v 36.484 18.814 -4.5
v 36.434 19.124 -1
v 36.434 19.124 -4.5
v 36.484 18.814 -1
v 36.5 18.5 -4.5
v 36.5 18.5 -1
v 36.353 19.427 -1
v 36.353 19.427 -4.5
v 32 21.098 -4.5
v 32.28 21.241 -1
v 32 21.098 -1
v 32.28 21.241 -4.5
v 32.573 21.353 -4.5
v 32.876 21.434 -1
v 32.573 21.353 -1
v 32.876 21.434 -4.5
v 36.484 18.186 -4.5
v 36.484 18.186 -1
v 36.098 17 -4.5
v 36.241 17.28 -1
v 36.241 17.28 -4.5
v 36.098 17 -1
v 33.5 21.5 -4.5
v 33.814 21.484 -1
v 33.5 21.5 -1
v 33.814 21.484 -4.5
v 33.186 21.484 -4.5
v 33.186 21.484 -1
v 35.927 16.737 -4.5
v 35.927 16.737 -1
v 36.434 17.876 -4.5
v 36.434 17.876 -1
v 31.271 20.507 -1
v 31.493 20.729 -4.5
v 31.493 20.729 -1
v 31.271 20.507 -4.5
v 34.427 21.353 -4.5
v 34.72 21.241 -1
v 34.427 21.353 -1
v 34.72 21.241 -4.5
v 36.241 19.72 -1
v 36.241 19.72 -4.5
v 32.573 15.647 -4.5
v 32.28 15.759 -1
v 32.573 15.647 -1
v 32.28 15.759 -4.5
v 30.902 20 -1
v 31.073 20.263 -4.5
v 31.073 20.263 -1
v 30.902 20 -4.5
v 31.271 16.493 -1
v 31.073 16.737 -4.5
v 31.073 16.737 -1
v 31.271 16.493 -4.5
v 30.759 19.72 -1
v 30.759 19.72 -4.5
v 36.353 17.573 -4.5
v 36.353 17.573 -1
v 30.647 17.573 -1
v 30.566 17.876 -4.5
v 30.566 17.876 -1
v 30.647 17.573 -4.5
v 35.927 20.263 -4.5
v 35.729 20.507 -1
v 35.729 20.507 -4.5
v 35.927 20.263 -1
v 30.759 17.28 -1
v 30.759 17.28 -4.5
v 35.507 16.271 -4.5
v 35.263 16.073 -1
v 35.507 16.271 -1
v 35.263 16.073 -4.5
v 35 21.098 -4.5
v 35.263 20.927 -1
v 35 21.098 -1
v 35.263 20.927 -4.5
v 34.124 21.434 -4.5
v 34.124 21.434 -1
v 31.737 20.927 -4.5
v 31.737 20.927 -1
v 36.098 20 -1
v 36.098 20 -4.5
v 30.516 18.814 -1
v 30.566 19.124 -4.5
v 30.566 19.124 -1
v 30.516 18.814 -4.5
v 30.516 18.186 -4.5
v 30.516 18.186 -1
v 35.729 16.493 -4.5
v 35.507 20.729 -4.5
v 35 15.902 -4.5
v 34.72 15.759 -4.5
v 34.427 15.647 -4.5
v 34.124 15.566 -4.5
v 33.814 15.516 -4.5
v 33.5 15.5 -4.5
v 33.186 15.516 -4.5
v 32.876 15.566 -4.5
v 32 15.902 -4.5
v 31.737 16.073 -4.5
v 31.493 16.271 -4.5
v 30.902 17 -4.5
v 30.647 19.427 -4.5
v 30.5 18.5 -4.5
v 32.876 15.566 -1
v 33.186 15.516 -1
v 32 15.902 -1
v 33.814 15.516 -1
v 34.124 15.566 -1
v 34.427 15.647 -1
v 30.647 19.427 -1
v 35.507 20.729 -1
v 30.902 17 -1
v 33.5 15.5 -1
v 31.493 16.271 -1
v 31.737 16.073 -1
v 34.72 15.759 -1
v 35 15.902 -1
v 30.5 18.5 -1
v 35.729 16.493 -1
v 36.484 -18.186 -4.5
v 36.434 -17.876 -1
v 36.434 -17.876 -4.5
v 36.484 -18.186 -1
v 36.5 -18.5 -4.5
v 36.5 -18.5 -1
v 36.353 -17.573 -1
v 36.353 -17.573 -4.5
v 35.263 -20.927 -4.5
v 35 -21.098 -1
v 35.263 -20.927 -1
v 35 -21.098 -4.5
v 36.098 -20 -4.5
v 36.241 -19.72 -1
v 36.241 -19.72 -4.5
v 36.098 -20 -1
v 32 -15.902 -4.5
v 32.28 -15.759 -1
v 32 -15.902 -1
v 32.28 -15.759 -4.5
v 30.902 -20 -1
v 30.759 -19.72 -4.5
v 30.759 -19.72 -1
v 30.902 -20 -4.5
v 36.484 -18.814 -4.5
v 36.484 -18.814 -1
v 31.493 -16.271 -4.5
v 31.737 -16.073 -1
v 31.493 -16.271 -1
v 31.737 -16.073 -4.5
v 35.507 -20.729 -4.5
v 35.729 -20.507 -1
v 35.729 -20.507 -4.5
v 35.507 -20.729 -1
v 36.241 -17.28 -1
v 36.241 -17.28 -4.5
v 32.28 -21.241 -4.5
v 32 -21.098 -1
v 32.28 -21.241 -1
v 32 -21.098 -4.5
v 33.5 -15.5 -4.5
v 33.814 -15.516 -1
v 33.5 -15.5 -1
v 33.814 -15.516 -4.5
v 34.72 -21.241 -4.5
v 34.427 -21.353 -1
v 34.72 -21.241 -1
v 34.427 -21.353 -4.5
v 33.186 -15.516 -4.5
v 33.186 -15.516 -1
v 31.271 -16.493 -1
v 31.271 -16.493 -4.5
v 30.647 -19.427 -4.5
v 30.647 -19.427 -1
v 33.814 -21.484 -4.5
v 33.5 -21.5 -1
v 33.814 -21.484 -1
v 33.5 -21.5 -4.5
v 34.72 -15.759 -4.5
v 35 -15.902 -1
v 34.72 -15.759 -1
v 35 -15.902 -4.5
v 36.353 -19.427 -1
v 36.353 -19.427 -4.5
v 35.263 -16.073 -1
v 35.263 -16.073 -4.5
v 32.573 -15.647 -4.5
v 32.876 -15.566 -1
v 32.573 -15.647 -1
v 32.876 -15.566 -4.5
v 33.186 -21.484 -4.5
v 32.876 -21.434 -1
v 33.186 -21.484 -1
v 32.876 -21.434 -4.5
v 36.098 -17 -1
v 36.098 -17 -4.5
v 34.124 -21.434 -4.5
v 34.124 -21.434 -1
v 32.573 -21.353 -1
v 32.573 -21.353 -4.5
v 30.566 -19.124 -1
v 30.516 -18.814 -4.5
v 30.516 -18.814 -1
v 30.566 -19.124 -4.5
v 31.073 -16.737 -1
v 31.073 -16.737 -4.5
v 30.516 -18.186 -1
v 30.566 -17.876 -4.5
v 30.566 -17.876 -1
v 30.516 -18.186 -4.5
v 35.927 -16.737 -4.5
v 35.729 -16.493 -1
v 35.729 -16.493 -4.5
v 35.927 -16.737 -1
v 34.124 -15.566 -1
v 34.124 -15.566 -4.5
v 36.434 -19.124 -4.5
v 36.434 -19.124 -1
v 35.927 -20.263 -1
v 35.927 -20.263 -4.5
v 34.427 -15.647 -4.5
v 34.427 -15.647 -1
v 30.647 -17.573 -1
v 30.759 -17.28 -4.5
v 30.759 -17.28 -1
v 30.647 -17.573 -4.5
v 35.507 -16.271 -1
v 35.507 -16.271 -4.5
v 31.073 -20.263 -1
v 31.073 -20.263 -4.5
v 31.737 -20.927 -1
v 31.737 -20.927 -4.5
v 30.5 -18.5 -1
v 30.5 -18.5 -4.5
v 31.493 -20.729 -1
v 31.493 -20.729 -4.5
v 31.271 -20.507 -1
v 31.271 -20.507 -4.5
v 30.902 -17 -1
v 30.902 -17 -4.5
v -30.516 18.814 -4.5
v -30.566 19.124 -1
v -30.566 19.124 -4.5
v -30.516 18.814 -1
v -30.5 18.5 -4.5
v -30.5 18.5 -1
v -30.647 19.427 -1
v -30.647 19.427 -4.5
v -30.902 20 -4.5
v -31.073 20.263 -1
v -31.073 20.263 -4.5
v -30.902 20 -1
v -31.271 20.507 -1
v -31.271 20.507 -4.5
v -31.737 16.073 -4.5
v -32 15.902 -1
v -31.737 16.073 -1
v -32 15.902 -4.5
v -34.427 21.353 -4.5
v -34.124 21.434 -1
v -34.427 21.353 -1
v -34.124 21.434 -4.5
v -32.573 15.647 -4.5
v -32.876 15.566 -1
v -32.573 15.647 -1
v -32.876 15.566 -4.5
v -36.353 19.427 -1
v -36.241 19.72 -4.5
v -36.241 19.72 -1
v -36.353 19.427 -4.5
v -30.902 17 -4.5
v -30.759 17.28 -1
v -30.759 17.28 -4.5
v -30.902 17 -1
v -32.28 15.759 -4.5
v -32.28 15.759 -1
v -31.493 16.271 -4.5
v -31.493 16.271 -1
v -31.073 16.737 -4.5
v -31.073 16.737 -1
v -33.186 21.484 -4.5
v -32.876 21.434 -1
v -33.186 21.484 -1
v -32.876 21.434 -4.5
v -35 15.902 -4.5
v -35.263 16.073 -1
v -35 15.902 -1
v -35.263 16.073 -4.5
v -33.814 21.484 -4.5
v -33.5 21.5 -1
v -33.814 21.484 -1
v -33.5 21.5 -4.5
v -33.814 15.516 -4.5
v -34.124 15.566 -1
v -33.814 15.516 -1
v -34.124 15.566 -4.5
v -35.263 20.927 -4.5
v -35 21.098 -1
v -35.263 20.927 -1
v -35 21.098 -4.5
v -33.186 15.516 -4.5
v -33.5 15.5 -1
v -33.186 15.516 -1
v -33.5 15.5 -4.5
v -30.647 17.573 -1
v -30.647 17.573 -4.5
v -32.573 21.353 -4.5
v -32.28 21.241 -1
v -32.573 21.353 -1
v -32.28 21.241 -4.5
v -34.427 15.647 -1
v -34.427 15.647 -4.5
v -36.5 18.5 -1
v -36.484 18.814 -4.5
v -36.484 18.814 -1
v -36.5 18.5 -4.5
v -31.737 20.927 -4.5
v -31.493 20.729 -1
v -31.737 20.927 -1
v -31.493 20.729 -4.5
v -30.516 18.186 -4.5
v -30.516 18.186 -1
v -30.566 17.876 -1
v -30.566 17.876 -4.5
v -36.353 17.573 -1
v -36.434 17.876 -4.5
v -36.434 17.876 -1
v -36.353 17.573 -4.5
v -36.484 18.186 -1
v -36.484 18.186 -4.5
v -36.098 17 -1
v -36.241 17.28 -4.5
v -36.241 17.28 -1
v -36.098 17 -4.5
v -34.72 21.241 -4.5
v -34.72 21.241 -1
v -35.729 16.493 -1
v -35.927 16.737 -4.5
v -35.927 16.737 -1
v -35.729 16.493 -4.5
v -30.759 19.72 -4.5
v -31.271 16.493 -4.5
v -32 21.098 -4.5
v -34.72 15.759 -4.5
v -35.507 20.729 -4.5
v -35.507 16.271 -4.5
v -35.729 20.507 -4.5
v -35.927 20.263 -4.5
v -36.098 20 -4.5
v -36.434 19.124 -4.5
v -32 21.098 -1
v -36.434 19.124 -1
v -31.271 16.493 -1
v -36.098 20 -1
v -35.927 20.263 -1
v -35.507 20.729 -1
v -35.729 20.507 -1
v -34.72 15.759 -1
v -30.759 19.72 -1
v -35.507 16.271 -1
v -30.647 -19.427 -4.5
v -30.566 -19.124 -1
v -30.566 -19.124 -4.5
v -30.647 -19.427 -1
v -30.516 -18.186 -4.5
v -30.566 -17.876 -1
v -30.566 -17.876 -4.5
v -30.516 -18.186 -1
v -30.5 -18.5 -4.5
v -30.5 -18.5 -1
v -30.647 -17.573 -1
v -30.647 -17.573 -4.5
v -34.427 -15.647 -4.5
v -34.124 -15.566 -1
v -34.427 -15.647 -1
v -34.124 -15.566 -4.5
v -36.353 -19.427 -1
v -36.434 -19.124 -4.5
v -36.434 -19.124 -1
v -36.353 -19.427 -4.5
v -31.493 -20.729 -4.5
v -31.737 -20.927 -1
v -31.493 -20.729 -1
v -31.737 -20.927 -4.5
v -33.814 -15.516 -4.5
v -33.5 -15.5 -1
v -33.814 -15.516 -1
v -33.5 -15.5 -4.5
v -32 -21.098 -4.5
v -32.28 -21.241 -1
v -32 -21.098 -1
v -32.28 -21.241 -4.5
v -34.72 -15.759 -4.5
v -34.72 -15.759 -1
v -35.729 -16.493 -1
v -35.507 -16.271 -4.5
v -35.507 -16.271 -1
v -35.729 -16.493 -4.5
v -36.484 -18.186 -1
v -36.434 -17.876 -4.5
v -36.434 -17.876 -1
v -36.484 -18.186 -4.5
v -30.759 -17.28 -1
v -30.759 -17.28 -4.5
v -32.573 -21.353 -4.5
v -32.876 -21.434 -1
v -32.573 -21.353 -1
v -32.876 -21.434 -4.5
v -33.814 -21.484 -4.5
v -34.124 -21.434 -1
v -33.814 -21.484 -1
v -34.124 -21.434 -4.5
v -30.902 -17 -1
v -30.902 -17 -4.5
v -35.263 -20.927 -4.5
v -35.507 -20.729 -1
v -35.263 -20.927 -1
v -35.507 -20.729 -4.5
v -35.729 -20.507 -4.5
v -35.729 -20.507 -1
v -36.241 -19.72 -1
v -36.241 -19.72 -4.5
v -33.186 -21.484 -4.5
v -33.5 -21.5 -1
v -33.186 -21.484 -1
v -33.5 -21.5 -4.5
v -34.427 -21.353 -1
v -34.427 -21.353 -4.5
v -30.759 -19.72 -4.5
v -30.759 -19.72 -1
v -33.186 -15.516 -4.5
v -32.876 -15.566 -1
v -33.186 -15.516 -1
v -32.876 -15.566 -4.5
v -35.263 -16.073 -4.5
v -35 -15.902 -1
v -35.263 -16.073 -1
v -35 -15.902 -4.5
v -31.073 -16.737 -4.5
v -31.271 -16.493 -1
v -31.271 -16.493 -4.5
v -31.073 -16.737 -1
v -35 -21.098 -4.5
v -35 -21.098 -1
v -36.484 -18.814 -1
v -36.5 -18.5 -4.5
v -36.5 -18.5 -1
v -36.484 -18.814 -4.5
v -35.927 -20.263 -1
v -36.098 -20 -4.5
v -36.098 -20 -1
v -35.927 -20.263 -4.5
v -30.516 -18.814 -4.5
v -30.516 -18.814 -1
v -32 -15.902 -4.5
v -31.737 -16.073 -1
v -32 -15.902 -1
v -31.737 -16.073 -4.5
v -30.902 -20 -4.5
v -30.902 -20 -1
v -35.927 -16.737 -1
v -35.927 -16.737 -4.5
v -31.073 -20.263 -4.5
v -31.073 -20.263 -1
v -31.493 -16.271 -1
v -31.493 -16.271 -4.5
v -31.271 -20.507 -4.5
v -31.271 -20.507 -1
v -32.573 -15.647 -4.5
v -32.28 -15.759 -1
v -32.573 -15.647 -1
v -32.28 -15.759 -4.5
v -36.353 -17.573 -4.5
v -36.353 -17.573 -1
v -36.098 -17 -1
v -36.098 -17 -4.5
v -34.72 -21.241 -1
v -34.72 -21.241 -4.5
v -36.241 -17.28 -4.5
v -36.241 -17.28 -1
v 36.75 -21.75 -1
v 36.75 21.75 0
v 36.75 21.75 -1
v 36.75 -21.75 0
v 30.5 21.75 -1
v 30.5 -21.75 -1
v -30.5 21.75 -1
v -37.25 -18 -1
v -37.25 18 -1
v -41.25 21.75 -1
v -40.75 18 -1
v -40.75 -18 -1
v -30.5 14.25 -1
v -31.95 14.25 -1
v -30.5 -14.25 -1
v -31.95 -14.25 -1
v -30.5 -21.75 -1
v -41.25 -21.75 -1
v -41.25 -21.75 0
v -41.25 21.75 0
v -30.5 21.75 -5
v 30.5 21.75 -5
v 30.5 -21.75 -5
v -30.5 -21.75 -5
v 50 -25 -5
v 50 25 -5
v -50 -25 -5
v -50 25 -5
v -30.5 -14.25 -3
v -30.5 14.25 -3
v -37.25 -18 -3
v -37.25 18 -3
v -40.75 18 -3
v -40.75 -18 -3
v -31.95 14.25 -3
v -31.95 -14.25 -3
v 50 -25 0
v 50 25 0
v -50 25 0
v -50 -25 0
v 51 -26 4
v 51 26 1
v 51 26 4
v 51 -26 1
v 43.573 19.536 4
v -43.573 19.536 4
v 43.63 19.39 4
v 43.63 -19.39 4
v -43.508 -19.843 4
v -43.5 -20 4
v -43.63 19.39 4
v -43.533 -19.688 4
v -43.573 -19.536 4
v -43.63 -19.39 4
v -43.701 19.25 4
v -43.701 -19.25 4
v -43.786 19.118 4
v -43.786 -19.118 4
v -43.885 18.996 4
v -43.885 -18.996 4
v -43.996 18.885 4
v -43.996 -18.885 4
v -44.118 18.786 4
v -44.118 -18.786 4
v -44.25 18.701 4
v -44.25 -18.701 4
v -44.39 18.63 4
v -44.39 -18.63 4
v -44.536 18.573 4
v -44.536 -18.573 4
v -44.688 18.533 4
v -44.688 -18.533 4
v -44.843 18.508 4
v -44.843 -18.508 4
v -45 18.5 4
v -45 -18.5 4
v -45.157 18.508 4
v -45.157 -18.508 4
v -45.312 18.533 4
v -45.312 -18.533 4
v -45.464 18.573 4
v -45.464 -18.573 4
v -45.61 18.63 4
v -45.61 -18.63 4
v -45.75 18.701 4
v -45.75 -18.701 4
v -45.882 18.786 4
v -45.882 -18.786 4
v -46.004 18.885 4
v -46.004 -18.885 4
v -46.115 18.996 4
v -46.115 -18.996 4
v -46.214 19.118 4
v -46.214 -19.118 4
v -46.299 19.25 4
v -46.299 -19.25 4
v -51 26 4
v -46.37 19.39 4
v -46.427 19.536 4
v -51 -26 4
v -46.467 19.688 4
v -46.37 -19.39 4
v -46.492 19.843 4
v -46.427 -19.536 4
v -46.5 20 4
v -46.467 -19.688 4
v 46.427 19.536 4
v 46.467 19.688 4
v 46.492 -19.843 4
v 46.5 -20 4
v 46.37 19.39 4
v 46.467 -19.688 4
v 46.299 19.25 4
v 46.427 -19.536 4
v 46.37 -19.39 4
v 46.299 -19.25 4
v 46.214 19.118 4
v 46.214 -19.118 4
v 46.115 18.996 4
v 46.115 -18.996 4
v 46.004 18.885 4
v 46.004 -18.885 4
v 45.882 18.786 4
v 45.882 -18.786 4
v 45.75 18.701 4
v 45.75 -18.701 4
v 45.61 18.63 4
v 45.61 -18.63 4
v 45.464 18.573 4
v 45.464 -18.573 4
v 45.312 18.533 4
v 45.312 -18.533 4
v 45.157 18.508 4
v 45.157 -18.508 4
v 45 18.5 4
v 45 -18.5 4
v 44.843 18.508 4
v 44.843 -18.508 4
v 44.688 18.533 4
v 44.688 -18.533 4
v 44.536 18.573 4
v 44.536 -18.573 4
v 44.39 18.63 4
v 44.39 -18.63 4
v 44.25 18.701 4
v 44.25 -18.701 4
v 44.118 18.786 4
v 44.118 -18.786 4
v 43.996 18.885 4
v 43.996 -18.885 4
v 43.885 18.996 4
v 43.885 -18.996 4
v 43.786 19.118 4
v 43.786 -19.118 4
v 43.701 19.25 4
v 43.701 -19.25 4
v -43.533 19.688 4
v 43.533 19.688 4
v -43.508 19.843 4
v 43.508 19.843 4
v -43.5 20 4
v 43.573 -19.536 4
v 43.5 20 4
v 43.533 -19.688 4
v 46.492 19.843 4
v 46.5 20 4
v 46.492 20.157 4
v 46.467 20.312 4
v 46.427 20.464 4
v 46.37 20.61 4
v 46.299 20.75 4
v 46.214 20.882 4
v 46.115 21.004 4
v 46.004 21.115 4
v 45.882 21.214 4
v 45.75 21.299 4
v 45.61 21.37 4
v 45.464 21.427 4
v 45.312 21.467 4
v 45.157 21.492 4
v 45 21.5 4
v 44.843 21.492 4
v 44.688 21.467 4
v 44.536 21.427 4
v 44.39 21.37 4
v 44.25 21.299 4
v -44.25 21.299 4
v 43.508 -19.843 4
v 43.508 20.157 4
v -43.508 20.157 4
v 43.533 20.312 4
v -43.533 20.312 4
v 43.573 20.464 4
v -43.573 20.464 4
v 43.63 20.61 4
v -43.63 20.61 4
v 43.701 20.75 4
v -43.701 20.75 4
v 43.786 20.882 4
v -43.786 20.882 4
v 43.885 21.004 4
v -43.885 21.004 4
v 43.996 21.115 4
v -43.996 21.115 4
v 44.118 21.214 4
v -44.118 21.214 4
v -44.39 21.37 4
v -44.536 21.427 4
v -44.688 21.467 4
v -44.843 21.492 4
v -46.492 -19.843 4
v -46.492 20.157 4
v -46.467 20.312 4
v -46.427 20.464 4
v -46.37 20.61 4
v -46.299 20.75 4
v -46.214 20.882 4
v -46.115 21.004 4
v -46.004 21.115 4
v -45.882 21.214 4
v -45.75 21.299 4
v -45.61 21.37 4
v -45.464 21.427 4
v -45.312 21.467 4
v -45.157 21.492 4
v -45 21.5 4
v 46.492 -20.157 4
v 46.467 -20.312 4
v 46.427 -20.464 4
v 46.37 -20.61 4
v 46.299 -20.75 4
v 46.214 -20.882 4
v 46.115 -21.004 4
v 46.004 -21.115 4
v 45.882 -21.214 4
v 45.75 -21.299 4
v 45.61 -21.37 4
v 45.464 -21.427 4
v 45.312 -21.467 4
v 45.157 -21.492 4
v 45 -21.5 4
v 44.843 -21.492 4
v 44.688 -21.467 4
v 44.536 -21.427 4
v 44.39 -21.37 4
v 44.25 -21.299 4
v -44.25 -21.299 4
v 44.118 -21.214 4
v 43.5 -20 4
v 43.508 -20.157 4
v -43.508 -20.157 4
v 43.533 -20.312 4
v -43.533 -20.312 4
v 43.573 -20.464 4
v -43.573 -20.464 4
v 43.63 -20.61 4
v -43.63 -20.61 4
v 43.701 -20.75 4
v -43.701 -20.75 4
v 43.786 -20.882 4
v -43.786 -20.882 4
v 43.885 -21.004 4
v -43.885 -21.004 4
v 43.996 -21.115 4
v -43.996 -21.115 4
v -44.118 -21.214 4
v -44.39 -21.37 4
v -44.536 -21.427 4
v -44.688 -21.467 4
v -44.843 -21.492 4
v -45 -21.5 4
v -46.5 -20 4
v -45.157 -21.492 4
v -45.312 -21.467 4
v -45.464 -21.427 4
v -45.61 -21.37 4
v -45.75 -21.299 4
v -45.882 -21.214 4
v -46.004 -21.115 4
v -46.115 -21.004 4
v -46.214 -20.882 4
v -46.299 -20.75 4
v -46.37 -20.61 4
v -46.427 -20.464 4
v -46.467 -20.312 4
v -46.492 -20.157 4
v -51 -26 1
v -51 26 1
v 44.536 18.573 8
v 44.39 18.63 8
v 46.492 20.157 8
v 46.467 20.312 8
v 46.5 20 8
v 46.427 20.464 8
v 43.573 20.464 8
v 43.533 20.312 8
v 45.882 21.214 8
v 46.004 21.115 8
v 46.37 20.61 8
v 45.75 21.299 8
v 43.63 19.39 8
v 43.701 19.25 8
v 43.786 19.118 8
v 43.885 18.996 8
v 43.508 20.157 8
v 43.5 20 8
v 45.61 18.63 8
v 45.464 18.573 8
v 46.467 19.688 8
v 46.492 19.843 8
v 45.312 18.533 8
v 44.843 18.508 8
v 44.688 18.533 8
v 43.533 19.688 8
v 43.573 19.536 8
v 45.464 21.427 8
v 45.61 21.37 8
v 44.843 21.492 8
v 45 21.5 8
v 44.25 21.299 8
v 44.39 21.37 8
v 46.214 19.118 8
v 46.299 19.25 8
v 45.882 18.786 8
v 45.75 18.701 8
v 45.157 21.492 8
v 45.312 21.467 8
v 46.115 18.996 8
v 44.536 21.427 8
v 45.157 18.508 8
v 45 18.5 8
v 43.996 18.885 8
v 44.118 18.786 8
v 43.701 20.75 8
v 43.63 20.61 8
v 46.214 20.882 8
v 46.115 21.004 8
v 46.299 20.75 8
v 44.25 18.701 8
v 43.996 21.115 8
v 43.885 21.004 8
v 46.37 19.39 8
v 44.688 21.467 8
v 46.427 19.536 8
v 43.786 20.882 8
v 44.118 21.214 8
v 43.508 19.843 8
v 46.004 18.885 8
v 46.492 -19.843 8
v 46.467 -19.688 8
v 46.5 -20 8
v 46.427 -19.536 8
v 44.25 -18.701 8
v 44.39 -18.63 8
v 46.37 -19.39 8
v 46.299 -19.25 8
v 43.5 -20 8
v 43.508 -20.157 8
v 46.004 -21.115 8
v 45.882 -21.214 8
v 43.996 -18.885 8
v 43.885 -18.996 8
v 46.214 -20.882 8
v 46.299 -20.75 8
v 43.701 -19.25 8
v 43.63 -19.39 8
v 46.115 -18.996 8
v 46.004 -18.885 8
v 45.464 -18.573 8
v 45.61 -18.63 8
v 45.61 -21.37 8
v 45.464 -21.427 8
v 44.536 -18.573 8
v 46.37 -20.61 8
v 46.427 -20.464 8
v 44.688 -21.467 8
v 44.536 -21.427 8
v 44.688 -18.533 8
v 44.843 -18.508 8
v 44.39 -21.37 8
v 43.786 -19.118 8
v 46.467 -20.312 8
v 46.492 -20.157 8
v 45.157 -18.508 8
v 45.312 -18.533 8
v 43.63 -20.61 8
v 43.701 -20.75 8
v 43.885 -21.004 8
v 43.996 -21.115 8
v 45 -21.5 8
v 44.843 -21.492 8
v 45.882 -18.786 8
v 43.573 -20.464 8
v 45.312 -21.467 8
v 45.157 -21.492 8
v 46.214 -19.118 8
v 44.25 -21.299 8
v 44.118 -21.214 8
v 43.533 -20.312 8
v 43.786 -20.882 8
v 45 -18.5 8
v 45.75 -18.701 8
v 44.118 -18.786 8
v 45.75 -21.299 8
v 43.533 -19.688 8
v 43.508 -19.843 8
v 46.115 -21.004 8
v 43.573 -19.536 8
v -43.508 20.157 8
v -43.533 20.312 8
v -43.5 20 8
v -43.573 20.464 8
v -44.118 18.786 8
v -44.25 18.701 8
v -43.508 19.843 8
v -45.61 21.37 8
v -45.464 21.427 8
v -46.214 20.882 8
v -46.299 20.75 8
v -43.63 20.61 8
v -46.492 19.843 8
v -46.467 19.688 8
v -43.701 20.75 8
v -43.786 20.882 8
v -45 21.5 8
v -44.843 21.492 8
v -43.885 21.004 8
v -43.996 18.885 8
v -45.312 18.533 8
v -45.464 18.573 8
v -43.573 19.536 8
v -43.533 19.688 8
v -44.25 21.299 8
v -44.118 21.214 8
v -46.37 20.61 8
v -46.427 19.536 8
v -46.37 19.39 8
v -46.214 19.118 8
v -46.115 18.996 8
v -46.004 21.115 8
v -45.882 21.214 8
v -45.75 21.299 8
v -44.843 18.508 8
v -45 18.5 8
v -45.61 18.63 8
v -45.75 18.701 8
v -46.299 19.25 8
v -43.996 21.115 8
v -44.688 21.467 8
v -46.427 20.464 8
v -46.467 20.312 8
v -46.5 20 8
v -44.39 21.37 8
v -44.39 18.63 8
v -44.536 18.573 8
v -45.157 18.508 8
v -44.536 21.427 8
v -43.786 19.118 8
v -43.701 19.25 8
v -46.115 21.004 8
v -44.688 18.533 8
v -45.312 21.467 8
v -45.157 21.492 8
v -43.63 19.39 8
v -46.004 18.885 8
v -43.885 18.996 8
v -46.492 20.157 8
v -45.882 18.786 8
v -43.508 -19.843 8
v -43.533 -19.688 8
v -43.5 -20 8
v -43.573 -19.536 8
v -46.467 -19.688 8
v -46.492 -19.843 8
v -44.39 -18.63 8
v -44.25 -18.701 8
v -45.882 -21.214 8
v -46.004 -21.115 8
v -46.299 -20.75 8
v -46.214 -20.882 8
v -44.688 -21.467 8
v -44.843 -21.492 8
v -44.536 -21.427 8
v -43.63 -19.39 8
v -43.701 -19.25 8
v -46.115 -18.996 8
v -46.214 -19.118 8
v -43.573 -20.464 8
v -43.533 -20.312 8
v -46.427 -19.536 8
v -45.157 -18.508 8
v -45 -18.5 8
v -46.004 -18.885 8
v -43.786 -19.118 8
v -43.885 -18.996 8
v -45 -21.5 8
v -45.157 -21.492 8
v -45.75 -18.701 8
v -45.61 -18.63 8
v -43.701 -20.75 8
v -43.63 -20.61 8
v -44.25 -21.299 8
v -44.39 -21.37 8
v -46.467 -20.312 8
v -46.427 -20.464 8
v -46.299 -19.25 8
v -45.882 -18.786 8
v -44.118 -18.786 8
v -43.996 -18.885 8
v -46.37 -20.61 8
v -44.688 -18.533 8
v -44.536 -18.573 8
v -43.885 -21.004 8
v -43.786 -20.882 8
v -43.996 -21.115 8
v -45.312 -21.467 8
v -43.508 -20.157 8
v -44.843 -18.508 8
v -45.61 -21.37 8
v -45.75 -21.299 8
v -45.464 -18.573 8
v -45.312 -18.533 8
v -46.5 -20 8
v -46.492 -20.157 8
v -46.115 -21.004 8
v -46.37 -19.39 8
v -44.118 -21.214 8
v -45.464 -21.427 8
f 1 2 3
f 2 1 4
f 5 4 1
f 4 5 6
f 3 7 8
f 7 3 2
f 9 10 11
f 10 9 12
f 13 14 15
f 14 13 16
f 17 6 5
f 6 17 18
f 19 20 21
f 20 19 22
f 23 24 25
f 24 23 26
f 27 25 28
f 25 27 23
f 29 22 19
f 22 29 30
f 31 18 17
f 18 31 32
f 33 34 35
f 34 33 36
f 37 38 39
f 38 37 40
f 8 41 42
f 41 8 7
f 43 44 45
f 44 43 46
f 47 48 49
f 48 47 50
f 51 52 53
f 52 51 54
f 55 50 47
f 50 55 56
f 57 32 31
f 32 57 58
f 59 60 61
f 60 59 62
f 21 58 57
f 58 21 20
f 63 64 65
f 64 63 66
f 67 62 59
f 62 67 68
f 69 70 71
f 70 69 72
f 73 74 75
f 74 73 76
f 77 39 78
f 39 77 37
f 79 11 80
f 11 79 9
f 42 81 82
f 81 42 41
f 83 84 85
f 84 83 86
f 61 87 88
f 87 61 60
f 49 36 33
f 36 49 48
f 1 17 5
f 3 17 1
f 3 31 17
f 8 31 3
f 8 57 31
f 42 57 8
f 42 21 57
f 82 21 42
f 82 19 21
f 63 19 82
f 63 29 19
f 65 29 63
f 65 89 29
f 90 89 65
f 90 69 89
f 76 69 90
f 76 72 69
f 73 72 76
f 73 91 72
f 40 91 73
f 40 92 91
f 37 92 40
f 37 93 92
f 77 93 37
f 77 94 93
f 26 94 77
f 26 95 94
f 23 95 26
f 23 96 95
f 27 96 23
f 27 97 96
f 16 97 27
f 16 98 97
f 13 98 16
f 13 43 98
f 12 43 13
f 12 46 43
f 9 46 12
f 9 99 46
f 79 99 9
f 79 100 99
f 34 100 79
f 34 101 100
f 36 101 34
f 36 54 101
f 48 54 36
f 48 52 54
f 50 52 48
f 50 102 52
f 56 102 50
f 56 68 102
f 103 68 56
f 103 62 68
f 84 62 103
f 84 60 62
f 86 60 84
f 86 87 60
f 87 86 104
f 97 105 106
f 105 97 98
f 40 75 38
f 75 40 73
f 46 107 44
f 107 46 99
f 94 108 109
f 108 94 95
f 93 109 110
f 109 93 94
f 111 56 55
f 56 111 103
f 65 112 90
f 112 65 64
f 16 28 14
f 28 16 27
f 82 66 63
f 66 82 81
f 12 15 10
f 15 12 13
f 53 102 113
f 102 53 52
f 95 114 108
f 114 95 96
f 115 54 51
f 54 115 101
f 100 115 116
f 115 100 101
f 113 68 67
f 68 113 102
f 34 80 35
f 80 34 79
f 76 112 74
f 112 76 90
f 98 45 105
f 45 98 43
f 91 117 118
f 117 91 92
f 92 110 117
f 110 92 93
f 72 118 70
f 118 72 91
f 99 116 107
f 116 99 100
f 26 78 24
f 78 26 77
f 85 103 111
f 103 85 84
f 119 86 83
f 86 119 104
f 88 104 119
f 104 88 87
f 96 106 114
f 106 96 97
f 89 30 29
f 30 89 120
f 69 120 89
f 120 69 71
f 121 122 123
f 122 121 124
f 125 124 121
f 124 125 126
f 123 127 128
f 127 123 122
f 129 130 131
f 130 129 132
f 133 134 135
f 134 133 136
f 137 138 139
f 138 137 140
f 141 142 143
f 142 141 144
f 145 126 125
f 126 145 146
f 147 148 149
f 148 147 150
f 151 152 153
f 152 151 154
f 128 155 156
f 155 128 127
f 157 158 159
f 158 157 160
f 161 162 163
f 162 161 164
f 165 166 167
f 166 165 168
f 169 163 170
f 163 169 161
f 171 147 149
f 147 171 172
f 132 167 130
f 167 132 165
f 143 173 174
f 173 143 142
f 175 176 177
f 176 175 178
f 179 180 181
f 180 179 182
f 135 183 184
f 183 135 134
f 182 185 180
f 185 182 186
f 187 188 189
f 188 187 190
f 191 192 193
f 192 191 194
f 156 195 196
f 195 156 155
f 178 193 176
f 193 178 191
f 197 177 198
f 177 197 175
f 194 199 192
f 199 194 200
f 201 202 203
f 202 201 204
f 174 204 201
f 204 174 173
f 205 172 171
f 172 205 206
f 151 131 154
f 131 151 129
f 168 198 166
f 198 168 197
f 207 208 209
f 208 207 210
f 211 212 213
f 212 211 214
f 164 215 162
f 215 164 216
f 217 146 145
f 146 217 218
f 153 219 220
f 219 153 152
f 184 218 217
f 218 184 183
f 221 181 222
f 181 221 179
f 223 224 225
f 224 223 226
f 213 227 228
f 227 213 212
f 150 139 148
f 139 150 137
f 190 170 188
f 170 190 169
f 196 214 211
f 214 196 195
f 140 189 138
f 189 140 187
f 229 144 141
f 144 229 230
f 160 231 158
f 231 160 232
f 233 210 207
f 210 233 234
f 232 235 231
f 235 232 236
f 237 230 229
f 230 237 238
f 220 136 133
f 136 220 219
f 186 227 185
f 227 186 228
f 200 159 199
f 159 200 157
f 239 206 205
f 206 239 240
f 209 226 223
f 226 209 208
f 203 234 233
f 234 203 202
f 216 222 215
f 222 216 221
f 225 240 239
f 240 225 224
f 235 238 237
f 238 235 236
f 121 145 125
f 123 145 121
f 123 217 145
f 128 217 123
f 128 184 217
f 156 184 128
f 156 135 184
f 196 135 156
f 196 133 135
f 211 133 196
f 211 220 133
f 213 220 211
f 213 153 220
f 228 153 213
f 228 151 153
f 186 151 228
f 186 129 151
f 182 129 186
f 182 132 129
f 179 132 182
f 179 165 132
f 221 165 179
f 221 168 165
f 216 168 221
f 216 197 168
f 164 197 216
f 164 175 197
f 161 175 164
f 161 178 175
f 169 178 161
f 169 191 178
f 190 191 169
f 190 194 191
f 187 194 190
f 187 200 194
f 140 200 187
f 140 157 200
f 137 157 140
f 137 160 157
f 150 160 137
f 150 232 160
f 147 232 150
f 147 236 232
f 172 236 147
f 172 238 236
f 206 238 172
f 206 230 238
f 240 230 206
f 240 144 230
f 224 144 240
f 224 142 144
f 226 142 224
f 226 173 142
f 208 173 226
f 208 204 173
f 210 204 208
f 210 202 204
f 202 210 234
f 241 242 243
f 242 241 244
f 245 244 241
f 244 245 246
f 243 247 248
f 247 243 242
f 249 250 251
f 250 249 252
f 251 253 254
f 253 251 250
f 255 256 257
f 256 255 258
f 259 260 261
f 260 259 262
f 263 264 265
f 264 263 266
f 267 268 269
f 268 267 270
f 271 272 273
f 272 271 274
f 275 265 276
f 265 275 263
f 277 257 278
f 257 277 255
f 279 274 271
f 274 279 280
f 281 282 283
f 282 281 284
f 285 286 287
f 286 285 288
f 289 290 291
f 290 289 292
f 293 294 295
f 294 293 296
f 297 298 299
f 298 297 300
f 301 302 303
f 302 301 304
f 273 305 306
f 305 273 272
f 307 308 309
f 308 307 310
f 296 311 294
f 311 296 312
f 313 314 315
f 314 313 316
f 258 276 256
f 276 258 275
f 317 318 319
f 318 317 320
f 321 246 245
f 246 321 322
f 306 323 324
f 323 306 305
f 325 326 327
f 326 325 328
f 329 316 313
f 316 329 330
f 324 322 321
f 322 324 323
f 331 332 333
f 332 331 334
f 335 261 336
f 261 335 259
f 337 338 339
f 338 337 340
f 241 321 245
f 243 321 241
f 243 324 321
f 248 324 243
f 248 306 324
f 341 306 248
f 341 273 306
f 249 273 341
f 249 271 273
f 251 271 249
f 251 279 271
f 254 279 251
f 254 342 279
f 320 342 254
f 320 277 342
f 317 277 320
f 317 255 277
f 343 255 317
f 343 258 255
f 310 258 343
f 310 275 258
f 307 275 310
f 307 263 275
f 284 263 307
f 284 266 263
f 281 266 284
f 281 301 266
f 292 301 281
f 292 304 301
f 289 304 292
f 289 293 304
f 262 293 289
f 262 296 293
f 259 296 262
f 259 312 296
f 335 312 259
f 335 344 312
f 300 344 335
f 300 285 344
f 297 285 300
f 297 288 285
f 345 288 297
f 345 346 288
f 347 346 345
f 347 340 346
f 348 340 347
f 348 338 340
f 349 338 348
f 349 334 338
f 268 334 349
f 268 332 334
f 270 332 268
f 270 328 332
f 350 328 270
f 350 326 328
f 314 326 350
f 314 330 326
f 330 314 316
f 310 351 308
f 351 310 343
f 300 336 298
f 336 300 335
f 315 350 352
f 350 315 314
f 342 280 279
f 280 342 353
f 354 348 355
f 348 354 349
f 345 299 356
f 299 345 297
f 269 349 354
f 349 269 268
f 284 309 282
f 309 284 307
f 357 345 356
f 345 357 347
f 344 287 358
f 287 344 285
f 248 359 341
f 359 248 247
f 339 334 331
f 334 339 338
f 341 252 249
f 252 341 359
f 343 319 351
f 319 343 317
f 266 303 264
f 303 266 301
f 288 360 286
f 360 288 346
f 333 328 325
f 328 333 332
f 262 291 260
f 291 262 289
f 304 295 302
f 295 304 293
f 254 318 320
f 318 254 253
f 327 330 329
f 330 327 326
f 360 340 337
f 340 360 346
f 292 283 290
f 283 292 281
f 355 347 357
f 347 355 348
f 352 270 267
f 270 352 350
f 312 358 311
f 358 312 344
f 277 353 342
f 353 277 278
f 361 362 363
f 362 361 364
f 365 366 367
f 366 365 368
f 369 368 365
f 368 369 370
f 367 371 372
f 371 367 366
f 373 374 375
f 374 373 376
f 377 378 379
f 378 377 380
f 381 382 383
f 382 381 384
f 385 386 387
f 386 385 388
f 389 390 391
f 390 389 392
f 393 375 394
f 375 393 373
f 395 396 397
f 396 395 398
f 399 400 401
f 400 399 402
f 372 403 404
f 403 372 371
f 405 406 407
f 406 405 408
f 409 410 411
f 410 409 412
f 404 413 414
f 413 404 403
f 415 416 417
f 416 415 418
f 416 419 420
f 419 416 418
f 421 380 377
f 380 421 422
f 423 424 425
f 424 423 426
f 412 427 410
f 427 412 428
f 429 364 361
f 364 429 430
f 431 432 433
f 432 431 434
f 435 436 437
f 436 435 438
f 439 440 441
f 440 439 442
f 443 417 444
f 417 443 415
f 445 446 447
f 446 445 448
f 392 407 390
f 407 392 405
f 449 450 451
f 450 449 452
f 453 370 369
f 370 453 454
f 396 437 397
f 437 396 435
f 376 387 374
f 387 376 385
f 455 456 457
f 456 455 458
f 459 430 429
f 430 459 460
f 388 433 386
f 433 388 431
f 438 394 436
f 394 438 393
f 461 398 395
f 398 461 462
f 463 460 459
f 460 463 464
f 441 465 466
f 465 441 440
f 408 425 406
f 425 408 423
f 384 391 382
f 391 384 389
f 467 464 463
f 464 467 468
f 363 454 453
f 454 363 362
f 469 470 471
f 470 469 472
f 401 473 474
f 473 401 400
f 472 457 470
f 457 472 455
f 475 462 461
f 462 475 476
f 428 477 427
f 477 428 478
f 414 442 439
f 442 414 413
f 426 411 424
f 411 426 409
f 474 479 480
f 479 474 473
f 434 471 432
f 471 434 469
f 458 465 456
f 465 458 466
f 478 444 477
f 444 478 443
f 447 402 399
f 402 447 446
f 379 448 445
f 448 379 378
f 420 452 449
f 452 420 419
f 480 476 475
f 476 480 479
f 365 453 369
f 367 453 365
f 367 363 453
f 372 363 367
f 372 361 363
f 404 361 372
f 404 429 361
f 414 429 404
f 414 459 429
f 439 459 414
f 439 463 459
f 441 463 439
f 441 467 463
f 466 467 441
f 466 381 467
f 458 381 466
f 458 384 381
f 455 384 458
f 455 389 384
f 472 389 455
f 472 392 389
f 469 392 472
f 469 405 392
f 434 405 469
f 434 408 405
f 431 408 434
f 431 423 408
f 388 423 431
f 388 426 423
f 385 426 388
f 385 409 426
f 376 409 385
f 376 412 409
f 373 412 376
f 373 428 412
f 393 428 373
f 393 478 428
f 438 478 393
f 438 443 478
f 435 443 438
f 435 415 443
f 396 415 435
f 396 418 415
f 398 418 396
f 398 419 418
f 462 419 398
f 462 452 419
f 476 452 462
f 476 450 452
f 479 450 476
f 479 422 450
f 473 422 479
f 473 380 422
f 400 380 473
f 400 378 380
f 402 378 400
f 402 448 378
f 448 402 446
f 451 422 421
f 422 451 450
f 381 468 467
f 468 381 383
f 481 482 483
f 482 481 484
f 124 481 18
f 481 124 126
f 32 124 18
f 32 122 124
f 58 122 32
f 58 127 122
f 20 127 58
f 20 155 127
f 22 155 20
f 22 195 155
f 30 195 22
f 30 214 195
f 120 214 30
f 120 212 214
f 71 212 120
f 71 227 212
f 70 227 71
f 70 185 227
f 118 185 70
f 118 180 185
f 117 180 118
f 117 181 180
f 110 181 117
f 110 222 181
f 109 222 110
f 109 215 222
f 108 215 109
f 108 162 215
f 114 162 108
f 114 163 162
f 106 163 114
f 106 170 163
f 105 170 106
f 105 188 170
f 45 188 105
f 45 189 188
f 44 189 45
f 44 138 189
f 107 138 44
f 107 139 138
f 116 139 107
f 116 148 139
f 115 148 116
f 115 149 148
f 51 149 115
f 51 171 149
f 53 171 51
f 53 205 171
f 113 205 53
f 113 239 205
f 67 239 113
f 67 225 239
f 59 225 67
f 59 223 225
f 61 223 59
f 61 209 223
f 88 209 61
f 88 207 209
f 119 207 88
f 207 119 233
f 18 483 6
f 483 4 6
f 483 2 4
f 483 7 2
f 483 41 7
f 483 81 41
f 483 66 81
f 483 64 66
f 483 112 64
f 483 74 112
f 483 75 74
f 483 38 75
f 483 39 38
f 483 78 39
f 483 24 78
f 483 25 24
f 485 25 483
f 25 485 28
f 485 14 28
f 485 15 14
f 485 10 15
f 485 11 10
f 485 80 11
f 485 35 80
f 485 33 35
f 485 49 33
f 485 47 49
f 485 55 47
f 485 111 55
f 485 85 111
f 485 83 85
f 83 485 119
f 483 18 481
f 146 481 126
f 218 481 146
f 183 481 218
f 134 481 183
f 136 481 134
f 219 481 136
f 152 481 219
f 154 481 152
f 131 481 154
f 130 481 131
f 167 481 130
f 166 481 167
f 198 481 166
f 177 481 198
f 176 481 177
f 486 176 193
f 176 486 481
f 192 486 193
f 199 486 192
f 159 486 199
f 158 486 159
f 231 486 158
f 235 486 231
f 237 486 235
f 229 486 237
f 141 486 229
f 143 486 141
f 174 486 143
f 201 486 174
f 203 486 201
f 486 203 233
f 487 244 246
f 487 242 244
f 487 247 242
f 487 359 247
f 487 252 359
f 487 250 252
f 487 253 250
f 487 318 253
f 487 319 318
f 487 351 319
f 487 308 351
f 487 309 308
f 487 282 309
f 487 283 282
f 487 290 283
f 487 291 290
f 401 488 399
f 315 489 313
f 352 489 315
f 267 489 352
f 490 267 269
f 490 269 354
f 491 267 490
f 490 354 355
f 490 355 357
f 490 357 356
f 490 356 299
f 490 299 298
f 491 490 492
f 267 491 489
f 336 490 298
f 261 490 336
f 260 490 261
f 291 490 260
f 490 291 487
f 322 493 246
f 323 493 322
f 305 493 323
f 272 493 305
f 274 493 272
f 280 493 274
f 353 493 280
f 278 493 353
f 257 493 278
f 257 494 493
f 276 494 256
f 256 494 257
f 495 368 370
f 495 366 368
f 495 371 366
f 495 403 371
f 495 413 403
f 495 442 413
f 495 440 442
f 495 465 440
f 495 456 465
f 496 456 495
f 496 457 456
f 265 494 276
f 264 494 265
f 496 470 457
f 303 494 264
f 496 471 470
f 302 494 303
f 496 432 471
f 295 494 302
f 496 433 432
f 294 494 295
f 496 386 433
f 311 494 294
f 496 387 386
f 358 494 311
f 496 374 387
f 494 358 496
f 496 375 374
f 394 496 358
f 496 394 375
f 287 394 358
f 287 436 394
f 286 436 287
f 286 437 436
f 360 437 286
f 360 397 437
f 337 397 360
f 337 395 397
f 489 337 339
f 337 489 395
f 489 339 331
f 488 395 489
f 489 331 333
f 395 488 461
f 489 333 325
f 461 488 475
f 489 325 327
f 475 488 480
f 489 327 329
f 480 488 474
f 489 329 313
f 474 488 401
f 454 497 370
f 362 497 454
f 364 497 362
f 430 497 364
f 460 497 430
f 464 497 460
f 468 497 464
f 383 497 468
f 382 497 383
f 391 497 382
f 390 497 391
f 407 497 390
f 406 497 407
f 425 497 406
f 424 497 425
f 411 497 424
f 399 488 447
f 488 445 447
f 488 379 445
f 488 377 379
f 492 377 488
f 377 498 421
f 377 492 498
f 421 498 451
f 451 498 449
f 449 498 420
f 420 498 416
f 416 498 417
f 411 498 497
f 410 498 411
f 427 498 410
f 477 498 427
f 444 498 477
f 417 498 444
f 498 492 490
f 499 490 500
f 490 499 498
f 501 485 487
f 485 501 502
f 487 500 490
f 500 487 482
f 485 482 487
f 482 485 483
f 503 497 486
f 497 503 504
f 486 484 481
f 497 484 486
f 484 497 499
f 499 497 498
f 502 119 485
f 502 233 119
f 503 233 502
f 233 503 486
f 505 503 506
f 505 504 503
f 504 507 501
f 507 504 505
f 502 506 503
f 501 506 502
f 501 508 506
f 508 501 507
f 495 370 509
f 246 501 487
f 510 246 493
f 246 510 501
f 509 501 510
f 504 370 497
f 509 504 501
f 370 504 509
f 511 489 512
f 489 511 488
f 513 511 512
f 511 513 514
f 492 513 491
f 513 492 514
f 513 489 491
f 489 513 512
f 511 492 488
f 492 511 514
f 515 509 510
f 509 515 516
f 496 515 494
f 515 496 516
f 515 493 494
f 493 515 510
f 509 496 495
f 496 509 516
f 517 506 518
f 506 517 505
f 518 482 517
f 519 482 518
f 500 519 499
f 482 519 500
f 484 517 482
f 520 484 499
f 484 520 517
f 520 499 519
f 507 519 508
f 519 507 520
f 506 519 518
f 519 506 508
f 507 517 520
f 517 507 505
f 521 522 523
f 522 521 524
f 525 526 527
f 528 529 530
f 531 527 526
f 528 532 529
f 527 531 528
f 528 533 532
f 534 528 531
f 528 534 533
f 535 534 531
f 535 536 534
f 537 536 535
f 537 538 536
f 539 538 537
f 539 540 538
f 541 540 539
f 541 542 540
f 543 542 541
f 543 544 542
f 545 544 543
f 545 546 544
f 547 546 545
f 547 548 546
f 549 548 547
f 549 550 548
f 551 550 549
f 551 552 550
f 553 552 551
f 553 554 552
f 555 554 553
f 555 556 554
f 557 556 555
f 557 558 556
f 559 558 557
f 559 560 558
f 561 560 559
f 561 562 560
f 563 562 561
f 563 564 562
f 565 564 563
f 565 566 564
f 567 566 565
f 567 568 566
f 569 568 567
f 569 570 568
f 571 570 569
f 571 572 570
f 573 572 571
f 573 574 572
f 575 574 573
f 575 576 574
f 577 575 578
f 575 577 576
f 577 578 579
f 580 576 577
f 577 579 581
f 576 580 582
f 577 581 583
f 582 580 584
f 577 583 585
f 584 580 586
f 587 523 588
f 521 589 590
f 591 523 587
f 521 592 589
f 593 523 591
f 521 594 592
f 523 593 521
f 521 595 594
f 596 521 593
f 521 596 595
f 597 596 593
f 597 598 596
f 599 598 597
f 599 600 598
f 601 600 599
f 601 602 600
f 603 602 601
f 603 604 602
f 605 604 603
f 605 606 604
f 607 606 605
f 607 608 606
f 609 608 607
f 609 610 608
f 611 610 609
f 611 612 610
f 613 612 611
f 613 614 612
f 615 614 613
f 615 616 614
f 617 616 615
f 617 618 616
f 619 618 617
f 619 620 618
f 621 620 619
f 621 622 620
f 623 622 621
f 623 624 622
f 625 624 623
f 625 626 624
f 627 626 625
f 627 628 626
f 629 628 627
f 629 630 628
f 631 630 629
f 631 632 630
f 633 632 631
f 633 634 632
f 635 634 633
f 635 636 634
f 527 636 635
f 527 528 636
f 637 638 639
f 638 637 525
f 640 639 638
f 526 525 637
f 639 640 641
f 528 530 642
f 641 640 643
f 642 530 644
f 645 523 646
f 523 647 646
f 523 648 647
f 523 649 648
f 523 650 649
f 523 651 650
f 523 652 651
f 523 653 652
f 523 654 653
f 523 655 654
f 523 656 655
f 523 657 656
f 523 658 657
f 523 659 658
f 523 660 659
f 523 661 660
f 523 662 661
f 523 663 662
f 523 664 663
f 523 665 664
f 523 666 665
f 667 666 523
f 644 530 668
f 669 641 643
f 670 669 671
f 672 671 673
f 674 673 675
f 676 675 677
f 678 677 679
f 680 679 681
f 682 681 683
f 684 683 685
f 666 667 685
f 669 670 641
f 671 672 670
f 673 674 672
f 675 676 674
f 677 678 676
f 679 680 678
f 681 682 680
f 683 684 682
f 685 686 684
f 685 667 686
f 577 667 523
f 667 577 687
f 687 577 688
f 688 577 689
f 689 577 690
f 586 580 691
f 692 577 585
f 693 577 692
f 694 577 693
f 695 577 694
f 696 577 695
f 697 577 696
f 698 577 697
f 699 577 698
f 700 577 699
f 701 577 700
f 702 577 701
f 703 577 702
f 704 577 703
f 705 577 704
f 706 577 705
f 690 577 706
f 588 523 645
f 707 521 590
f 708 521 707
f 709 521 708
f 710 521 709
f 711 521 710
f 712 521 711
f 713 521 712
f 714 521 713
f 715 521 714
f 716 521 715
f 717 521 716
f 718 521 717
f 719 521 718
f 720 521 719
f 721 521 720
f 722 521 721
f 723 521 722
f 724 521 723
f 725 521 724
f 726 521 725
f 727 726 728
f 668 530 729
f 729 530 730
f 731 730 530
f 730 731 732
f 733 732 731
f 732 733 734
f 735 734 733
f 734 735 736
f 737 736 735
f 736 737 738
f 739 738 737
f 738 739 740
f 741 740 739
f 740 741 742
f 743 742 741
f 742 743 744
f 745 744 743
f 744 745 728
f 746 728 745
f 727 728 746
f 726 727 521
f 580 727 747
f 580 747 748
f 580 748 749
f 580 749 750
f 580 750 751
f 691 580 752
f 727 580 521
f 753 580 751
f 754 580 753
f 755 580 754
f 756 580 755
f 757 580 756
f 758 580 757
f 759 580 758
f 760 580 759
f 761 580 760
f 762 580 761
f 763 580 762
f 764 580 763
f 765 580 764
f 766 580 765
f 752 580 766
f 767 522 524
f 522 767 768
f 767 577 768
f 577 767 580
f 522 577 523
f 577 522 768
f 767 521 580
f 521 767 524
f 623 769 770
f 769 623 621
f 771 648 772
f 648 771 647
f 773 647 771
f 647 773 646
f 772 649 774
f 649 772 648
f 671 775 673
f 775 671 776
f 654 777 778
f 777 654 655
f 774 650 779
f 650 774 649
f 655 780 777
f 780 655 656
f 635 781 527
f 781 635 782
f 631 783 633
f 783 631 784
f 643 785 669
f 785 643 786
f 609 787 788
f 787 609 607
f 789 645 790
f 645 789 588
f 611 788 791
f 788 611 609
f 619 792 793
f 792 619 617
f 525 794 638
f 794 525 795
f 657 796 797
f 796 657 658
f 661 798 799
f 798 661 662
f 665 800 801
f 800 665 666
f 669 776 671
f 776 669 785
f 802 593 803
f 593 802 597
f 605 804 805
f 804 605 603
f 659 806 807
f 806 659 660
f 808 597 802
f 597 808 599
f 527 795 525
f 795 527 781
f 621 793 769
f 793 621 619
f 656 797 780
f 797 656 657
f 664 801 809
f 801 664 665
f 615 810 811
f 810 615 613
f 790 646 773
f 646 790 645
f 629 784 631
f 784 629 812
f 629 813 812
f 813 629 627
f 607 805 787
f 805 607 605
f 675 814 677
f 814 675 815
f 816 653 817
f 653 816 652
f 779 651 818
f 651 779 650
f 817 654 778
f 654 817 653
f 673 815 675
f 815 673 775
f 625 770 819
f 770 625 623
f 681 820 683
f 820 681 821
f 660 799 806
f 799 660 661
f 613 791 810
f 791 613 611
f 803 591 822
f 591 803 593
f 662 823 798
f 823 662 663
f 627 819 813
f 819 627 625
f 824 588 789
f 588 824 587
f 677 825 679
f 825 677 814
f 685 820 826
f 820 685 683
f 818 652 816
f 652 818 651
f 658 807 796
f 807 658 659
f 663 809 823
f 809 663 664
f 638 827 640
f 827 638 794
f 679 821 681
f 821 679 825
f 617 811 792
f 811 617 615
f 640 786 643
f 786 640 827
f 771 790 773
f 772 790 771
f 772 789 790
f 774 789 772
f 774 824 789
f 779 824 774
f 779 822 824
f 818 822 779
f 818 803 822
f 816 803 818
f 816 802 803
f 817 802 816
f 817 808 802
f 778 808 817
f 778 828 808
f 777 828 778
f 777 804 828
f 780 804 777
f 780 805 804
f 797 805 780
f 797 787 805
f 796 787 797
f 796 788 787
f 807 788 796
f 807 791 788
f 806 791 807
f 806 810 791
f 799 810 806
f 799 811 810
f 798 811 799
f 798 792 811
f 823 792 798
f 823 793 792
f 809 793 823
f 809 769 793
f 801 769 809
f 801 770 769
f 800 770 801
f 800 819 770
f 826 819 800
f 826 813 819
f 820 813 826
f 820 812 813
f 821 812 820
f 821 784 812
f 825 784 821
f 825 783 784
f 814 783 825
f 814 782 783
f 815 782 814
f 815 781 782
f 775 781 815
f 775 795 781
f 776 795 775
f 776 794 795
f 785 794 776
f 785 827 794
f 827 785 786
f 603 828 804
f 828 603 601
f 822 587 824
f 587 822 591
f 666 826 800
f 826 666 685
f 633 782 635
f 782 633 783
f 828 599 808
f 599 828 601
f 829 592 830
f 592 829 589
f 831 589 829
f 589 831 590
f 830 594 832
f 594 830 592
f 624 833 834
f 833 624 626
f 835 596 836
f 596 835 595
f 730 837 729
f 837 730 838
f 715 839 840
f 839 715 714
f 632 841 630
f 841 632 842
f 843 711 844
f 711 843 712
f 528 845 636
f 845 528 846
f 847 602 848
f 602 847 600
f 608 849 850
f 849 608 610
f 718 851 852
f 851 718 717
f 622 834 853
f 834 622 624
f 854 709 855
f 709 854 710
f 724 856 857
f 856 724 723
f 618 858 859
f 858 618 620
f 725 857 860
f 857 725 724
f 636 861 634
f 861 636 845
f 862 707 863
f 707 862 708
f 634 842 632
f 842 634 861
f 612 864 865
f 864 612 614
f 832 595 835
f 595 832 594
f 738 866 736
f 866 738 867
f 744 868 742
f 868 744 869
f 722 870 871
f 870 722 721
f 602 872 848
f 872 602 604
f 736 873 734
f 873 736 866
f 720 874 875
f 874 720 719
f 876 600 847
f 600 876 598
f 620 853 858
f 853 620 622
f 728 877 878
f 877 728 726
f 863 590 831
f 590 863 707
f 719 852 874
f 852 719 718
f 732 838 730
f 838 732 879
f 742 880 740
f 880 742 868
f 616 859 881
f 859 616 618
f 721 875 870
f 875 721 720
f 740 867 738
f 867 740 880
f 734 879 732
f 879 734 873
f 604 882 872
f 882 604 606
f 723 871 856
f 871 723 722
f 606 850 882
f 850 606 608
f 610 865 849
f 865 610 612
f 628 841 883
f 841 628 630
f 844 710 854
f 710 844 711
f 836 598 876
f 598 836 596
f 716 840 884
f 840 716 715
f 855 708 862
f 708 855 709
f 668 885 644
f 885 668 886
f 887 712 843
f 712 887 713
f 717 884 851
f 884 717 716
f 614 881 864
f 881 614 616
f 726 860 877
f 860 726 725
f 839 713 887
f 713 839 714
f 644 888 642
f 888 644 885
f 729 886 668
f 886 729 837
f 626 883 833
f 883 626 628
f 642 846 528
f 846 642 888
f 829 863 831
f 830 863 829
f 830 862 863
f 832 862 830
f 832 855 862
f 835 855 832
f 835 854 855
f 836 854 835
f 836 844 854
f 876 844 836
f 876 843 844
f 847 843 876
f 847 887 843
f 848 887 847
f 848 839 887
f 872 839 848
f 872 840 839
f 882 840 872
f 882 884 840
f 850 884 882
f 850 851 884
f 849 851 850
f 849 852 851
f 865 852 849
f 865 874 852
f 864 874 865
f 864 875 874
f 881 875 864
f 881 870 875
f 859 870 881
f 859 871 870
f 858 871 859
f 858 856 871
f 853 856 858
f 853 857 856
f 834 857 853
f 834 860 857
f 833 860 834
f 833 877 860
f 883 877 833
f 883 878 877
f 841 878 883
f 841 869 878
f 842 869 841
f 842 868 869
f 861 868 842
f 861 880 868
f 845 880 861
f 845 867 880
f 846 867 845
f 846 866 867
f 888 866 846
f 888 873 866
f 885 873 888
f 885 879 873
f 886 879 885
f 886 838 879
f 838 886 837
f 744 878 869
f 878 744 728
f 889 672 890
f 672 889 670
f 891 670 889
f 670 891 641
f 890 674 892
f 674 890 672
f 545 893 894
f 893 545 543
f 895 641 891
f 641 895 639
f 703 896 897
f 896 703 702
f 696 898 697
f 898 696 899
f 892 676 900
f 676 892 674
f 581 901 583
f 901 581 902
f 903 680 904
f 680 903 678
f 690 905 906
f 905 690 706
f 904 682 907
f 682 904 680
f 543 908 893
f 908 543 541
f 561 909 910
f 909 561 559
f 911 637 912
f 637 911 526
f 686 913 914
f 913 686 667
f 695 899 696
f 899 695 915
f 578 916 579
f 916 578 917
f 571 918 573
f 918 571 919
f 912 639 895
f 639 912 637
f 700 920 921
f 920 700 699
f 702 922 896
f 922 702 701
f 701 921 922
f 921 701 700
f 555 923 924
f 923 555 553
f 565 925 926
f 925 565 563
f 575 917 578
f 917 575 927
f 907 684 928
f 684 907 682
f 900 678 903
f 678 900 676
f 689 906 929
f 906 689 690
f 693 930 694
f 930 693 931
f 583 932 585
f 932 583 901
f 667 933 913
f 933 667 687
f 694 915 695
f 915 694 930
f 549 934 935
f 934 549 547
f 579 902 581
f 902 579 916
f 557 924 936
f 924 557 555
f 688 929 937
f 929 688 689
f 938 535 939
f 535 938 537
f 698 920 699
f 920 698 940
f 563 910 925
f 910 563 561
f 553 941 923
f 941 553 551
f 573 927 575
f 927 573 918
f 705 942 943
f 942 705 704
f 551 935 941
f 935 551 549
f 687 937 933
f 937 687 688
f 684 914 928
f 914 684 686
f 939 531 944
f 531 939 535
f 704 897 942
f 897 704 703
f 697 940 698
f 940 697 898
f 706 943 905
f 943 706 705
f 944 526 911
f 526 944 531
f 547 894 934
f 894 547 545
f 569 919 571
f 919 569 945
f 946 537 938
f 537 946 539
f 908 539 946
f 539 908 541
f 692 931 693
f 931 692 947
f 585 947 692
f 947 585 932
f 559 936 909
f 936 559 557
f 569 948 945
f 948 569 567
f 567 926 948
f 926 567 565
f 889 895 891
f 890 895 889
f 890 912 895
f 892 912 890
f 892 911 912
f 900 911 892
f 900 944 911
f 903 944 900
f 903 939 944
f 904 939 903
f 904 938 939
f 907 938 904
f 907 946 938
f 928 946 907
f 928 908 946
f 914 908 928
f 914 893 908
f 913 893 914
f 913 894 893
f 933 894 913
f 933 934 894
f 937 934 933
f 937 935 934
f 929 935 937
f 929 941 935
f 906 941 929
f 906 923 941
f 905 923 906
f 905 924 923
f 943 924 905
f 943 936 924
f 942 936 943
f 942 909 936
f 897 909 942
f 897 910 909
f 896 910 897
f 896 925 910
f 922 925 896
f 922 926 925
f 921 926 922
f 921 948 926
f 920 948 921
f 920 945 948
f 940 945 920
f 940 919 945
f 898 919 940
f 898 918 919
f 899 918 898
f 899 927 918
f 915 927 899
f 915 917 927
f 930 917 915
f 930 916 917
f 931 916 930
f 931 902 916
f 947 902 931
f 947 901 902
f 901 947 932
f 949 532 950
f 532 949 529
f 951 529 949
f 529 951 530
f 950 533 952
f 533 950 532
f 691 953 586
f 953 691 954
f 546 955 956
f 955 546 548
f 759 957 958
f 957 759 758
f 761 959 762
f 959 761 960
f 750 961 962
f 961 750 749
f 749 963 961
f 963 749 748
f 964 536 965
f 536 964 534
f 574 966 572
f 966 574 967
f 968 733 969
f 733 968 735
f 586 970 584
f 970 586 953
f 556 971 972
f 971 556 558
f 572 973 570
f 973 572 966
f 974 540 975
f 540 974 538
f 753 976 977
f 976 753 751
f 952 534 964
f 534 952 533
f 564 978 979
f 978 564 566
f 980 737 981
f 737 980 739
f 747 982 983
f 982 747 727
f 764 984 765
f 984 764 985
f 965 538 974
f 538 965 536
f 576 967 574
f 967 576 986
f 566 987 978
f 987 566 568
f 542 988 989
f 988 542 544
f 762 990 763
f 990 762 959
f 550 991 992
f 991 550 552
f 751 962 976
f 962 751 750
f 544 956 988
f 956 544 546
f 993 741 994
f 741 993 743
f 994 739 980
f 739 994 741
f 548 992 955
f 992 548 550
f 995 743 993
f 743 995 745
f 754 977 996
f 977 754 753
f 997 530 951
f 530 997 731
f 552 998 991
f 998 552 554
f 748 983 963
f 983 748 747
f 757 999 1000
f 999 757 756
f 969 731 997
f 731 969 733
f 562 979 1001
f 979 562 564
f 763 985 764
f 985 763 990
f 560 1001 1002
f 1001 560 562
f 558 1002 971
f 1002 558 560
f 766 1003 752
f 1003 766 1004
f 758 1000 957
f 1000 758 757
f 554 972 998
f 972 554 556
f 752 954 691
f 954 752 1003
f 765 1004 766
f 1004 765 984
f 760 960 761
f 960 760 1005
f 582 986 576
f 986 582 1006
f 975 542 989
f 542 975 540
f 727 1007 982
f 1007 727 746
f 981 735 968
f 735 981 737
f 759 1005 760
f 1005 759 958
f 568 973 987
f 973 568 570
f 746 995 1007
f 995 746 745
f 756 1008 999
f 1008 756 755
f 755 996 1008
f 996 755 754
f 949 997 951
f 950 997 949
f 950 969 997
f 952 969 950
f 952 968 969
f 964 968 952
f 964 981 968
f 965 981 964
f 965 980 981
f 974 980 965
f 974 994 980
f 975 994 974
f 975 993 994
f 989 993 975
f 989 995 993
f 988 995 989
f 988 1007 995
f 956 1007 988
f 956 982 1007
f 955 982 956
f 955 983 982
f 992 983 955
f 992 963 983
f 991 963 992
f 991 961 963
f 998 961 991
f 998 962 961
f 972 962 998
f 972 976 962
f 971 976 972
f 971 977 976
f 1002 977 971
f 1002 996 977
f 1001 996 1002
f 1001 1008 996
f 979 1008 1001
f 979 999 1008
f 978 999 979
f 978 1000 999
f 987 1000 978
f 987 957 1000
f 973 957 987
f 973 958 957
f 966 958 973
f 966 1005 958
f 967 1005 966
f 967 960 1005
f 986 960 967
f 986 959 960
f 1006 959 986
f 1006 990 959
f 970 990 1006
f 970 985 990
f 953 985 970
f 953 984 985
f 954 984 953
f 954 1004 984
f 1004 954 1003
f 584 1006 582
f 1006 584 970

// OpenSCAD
// ILI9341

ili_negative = true;
ili_positive = false;
ili_halterung_negative = true;
ili_halterung_positive = false;


if (ili_negative) {
    difference() { 
        translate([0,0,-2.5])
        cube([100,50,5],center=true);
        ili9341(true);
        
    }
}

if (ili_positive) ili9341();
if (ili_halterung_positive) ili_halterung();
if (ili_halterung_negative) ili_halterung(true);

module ili9341(negative = false) {
    l=77;
    h=42.5;
    t=2;
    $fn=60;
    
    translate([-((l/2-5.5/2)-3.5-30),0,0])
    union() {
        difference() {
            if (!negative) {
                color("red")
                cube([l,h,t],center=true);
            }
            if (negative) {
                color("red")
                cube([l+1,h+1,t],center=true);
            }
            if(!negative) {
                translate([l/2-5.5/2,37/2,0])
                cylinder(d=3,h=5, center=true);
                
                translate([l/2-5.5/2,-37/2,0])
                cylinder(d=3,h=5, center=true);
             
                translate([l/2-5.5/2-67,37/2,0])
                cylinder(d=3,h=5, center=true);
                
                translate([l/2-5.5/2-67,-37/2,0])
                cylinder(d=3,h=5, center=true);
            } 
      
        }
        
        if (negative) {
            translate([0,0,-2])
            union() {
                translate([l/2-5.5/2,37/2,0])
                cylinder(d=6,h=5, center=true);
                
                translate([l/2-5.5/2,-37/2,0])
                cylinder(d=6,h=5, center=true);
             
                translate([l/2-5.5/2-67,37/2,0])
                cylinder(d=6,h=5, center=true);
                
                translate([l/2-5.5/2-67,-37/2,0])
                cylinder(d=6,h=5, center=true);
            }
            translate([0,0,3])
            union() {
                translate([l/2-5.5/2,37/2,0])
                cylinder(d=2.5,h=5, center=true);
                
                translate([l/2-5.5/2,-37/2,0])
                cylinder(d=2.5,h=5, center=true);
             
                translate([l/2-5.5/2-67,37/2,0])
                cylinder(d=2.5,h=5, center=true);
                
                translate([l/2-5.5/2-67,-37/2,0])
                cylinder(d=2.5,h=5, center=true);
            }
        }
        

        if(!negative) {
            color("black")
            translate([(l/2-5.5/2)-3.5-30,0,-3])
            cube([60,42.5,4],center=true);
        }
        
        if(negative) {
            color("black")
            translate([(l/2-5.5/2)-3.5-30,0,-3])
            cube([61,43.5,4],center=true);
        }
        
        
        //Displayausschnitt
        if(negative) {
            color("gray")
            translate([(l/2-5.5/2)+.5-30,0,-20])
            cube([50,40,40],center=true);
        }
        
        // Stiftleiste
        color("silver")
        translate([-l/2,-36/2,-3])
        cube([3.5,36,15]);

        // Kabel
        color("brown")
        translate([-l/2+8.8,-28.5/2,-3])
        cube([2,28.5,2]);
        
        // SD Slot
        color("silver")
        translate([l/2-14-15,-12.5,2.5])
        cube([28,18,3],center=true);
        
        // ICs
        color("black")
        translate([-l/2+10+12,6.3,1.8])
        cube([20,30,2.0],center=true);
        
        // 3 Widerstände
        color("brown")
        translate([14-5,7,1.8])
        cube([10,5,2.0],center=true);

    }    
}


module ili_halterung(negative=false) {
    $fn=60;
    
    if (!negative) {
        difference() {
            translate([0,0,2.5])
            cube([100,50,3],center=true);
            ili9341(true);
            
            // Befestigung
            
            translate([45,20,3])
            cylinder(d=3,h=7, center=true);
            
            translate([45,-20,3])
            cylinder(d=3,h=7, center=true);

            translate([-45,20,3])
            cylinder(d=3,h=7, center=true);
            
            translate([-45,-20,3])
            cylinder(d=3,h=7, center=true);
        }
    }
    
    if (negative) {
            translate([0,0,2.5])
            cube([102,52,3],center=true);
        
            // Befestigung
            
            translate([45,20,6])
            cylinder(d=3,h=4, center=true);
            
            translate([45,-20,6])
            cylinder(d=3,h=4, center=true);

            translate([-45,20,6])
            cylinder(d=3,h=4, center=true);
            
            translate([-45,-20,6])
            cylinder(d=3,h=4, center=true);
    }
}
